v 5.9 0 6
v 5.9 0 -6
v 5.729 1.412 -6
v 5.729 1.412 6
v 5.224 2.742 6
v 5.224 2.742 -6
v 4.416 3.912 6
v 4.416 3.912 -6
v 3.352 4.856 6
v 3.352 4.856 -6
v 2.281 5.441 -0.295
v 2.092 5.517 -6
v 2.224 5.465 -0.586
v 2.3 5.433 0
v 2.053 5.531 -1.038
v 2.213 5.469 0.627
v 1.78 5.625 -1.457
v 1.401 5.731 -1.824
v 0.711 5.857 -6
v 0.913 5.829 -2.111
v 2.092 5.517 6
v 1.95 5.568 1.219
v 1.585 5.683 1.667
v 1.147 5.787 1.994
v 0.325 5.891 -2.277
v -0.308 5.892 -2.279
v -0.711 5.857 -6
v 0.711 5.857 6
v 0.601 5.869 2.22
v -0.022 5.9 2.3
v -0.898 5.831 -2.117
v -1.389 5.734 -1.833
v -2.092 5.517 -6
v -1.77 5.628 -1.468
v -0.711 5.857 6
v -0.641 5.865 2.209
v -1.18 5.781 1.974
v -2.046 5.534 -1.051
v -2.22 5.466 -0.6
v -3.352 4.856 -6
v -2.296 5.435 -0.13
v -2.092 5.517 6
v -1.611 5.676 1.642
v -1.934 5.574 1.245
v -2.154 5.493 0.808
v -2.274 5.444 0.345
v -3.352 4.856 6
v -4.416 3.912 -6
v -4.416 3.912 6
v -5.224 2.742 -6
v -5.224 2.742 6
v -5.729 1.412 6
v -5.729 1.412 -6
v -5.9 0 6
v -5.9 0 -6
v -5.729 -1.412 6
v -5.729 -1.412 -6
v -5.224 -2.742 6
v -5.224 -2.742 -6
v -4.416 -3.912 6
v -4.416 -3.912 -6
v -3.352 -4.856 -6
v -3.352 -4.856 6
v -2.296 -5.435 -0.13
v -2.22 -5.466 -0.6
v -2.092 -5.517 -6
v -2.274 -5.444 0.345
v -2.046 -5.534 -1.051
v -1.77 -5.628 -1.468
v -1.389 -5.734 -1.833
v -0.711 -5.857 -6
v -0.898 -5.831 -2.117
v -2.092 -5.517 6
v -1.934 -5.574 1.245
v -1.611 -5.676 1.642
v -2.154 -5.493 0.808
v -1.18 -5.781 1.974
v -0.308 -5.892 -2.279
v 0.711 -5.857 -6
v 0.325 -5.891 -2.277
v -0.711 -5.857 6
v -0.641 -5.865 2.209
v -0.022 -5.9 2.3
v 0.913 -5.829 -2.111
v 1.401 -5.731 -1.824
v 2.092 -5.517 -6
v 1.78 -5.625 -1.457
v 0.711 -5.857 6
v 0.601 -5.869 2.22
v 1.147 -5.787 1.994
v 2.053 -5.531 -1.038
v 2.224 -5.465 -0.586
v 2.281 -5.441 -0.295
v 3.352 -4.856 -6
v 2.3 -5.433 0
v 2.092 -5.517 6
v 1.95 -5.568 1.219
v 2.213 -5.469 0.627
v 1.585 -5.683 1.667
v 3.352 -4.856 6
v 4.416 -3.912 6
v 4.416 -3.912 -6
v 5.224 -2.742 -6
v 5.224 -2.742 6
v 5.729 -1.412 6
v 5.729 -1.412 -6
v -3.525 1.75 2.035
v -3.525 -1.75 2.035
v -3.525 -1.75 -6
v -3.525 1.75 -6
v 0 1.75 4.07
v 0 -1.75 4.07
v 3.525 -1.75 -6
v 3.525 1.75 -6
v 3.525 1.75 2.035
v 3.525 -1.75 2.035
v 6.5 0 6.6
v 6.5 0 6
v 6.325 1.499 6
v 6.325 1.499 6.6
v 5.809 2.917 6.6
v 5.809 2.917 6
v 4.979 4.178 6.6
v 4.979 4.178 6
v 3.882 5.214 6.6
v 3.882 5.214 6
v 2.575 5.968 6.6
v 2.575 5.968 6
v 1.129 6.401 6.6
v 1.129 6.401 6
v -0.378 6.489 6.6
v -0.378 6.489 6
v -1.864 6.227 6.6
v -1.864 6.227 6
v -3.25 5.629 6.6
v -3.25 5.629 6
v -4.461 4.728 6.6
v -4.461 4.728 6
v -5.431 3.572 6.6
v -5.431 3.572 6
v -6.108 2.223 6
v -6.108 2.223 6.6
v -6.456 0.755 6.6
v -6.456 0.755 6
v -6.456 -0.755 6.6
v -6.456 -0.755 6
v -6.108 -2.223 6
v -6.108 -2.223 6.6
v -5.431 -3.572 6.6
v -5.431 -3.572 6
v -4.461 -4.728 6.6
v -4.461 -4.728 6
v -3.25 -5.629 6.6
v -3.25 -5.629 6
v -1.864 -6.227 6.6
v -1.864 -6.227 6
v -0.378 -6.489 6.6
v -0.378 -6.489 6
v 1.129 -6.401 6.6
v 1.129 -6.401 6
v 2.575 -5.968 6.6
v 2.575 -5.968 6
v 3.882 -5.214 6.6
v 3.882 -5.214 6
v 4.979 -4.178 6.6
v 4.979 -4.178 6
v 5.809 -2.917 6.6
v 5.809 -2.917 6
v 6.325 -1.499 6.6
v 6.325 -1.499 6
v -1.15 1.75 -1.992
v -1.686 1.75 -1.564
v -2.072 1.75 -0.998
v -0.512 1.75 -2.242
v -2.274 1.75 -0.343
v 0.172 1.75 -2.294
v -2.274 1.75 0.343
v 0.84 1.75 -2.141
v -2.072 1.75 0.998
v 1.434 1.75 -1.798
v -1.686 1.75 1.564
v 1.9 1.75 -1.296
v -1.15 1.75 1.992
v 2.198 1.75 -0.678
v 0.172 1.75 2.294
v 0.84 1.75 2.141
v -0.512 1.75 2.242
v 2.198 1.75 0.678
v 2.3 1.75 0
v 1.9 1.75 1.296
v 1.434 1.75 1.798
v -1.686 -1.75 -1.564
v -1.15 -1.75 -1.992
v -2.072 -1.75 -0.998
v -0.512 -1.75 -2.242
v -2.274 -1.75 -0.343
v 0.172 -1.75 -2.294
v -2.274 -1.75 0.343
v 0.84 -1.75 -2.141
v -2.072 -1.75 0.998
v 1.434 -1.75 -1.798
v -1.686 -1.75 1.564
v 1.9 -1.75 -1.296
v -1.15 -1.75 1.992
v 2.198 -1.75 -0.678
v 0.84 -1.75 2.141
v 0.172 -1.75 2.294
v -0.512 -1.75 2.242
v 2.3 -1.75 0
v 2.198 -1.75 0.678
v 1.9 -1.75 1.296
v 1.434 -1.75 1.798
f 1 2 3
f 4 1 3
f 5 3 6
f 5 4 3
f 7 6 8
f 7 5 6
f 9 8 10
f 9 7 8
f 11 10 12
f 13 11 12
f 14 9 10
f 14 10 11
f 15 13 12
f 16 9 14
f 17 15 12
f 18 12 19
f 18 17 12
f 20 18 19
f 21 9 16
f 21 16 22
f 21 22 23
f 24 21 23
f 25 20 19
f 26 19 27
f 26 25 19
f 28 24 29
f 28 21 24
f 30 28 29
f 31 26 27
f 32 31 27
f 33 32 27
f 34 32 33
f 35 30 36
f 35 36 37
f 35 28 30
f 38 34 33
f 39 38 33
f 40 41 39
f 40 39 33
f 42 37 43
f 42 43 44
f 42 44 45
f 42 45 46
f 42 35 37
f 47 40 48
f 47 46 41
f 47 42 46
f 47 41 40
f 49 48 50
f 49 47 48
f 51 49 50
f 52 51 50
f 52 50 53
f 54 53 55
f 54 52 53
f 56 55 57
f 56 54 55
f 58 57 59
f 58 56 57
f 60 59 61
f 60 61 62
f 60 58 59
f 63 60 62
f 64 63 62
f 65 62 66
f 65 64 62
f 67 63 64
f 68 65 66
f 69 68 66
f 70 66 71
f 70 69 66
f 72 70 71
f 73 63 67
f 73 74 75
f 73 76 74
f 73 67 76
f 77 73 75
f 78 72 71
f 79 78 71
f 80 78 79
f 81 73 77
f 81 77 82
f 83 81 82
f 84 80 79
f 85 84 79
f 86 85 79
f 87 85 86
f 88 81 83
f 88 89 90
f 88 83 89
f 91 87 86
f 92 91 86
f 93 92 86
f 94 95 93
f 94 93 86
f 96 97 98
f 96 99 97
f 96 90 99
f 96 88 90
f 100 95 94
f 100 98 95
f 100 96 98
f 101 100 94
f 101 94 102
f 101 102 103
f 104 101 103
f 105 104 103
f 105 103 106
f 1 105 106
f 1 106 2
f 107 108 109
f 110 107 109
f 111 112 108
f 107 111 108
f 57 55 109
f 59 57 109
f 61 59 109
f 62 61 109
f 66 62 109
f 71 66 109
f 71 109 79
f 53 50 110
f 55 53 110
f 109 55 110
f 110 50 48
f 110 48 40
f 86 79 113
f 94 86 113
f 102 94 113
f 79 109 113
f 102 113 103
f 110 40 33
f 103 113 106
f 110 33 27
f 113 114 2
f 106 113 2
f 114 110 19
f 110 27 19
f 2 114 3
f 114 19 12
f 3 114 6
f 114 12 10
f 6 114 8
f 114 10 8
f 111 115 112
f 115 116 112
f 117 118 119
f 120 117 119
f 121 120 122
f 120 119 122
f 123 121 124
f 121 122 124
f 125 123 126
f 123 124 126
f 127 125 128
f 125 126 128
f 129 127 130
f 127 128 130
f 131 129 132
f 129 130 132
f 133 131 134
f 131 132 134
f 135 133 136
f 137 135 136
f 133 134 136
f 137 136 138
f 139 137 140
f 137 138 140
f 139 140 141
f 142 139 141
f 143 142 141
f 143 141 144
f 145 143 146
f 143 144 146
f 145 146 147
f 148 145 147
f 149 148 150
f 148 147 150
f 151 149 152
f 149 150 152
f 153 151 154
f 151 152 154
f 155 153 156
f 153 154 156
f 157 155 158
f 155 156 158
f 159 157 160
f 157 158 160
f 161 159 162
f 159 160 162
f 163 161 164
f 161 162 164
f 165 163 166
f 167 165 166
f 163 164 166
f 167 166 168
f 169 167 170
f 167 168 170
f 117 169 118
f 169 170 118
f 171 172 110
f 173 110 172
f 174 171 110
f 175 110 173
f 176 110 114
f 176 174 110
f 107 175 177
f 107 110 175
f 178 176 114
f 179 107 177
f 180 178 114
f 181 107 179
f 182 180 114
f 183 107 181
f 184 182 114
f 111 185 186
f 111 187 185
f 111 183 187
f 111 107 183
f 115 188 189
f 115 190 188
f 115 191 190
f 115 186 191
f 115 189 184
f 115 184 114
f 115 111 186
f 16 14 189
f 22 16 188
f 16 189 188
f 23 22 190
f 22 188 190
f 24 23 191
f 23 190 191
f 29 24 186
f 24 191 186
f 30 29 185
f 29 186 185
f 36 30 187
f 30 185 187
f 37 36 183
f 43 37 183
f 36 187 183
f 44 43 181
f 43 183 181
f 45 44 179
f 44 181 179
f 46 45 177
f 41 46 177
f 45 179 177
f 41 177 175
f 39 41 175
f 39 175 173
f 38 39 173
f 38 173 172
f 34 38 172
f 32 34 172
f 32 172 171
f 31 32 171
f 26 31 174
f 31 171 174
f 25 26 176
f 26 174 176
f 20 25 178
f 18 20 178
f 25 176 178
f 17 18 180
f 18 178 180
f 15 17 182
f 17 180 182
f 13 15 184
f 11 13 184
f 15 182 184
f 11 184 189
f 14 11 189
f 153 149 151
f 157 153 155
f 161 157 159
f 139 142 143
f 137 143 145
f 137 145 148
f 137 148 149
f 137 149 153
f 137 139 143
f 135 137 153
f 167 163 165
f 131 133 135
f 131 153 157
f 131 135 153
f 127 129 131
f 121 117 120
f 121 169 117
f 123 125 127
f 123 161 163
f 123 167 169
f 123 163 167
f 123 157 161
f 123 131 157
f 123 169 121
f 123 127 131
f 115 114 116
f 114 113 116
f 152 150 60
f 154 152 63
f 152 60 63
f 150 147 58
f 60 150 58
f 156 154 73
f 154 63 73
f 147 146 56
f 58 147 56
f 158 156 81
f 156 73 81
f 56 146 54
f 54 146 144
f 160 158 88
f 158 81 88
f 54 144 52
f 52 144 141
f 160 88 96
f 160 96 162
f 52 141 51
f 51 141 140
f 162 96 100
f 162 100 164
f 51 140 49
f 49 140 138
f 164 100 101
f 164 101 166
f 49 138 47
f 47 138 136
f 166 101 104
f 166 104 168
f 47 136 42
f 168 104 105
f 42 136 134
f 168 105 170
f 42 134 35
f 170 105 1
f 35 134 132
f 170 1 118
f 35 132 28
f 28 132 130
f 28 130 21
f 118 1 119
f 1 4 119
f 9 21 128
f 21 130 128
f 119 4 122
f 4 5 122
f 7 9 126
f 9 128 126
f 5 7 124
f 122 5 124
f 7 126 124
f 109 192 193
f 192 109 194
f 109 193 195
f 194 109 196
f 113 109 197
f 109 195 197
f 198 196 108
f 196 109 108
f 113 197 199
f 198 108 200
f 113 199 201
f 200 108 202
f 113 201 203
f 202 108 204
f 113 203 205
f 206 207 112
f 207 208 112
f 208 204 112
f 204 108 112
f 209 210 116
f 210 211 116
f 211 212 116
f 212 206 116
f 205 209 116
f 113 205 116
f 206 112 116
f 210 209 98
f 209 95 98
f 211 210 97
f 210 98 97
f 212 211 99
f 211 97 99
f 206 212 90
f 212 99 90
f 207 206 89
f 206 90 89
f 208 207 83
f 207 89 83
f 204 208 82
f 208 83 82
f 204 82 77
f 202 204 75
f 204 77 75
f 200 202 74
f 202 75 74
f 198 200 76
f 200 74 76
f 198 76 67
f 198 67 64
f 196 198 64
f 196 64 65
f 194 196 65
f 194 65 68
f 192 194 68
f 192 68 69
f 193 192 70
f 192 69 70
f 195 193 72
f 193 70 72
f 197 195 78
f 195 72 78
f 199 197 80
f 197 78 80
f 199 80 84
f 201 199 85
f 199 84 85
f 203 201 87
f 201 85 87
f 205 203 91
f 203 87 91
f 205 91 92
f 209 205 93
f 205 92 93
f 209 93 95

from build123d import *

# Parameters (mm, degrees)
PAD001_DEPTH = 1.75
SKETCH002_R  = 2.3
PAD002_DEPTH = 6.5
SKETCH_R     = 5.9
PAD_DEPTH    = 6
SKETCH003_R  = 6.5
PAD003_DEPTH = 0.6


with BuildPart() as pad001:
    # Sketch001 → Pad001 (new body, symmetric)
    with BuildSketch(Plane.XZ):
        Polygon((3.525, -2.03516), (3.525, 2.03516), (0, 4.070319), (-3.525, 2.03516), (-3.525, -2.03516), (-3.525, -6), (3.525, -6), align=None)
    extrude(amount=PAD001_DEPTH, both=True)


with BuildPart() as pad002:
    # Sketch002 → Pad002 (new body, symmetric)
    with BuildSketch(Plane.XZ):
        Circle(SKETCH002_R)
    extrude(amount=PAD002_DEPTH, both=True)


with BuildPart() as pad003:
    # Sketch → Pad (new body, symmetric)
    with BuildSketch(Plane.XY):
        Circle(SKETCH_R)
    extrude(amount=PAD_DEPTH, both=True)

    # Cut: cut Pad002
    add(pad002.part, mode=Mode.SUBTRACT)

    # Cut001: cut Pad001
    add(pad001.part, mode=Mode.SUBTRACT)

    # Sketch003 → Pad003 (new body)
    with BuildSketch(Plane.XY.offset(6)):
        Circle(SKETCH003_R)
    extrude(amount=PAD003_DEPTH)


solid = pad003.part
